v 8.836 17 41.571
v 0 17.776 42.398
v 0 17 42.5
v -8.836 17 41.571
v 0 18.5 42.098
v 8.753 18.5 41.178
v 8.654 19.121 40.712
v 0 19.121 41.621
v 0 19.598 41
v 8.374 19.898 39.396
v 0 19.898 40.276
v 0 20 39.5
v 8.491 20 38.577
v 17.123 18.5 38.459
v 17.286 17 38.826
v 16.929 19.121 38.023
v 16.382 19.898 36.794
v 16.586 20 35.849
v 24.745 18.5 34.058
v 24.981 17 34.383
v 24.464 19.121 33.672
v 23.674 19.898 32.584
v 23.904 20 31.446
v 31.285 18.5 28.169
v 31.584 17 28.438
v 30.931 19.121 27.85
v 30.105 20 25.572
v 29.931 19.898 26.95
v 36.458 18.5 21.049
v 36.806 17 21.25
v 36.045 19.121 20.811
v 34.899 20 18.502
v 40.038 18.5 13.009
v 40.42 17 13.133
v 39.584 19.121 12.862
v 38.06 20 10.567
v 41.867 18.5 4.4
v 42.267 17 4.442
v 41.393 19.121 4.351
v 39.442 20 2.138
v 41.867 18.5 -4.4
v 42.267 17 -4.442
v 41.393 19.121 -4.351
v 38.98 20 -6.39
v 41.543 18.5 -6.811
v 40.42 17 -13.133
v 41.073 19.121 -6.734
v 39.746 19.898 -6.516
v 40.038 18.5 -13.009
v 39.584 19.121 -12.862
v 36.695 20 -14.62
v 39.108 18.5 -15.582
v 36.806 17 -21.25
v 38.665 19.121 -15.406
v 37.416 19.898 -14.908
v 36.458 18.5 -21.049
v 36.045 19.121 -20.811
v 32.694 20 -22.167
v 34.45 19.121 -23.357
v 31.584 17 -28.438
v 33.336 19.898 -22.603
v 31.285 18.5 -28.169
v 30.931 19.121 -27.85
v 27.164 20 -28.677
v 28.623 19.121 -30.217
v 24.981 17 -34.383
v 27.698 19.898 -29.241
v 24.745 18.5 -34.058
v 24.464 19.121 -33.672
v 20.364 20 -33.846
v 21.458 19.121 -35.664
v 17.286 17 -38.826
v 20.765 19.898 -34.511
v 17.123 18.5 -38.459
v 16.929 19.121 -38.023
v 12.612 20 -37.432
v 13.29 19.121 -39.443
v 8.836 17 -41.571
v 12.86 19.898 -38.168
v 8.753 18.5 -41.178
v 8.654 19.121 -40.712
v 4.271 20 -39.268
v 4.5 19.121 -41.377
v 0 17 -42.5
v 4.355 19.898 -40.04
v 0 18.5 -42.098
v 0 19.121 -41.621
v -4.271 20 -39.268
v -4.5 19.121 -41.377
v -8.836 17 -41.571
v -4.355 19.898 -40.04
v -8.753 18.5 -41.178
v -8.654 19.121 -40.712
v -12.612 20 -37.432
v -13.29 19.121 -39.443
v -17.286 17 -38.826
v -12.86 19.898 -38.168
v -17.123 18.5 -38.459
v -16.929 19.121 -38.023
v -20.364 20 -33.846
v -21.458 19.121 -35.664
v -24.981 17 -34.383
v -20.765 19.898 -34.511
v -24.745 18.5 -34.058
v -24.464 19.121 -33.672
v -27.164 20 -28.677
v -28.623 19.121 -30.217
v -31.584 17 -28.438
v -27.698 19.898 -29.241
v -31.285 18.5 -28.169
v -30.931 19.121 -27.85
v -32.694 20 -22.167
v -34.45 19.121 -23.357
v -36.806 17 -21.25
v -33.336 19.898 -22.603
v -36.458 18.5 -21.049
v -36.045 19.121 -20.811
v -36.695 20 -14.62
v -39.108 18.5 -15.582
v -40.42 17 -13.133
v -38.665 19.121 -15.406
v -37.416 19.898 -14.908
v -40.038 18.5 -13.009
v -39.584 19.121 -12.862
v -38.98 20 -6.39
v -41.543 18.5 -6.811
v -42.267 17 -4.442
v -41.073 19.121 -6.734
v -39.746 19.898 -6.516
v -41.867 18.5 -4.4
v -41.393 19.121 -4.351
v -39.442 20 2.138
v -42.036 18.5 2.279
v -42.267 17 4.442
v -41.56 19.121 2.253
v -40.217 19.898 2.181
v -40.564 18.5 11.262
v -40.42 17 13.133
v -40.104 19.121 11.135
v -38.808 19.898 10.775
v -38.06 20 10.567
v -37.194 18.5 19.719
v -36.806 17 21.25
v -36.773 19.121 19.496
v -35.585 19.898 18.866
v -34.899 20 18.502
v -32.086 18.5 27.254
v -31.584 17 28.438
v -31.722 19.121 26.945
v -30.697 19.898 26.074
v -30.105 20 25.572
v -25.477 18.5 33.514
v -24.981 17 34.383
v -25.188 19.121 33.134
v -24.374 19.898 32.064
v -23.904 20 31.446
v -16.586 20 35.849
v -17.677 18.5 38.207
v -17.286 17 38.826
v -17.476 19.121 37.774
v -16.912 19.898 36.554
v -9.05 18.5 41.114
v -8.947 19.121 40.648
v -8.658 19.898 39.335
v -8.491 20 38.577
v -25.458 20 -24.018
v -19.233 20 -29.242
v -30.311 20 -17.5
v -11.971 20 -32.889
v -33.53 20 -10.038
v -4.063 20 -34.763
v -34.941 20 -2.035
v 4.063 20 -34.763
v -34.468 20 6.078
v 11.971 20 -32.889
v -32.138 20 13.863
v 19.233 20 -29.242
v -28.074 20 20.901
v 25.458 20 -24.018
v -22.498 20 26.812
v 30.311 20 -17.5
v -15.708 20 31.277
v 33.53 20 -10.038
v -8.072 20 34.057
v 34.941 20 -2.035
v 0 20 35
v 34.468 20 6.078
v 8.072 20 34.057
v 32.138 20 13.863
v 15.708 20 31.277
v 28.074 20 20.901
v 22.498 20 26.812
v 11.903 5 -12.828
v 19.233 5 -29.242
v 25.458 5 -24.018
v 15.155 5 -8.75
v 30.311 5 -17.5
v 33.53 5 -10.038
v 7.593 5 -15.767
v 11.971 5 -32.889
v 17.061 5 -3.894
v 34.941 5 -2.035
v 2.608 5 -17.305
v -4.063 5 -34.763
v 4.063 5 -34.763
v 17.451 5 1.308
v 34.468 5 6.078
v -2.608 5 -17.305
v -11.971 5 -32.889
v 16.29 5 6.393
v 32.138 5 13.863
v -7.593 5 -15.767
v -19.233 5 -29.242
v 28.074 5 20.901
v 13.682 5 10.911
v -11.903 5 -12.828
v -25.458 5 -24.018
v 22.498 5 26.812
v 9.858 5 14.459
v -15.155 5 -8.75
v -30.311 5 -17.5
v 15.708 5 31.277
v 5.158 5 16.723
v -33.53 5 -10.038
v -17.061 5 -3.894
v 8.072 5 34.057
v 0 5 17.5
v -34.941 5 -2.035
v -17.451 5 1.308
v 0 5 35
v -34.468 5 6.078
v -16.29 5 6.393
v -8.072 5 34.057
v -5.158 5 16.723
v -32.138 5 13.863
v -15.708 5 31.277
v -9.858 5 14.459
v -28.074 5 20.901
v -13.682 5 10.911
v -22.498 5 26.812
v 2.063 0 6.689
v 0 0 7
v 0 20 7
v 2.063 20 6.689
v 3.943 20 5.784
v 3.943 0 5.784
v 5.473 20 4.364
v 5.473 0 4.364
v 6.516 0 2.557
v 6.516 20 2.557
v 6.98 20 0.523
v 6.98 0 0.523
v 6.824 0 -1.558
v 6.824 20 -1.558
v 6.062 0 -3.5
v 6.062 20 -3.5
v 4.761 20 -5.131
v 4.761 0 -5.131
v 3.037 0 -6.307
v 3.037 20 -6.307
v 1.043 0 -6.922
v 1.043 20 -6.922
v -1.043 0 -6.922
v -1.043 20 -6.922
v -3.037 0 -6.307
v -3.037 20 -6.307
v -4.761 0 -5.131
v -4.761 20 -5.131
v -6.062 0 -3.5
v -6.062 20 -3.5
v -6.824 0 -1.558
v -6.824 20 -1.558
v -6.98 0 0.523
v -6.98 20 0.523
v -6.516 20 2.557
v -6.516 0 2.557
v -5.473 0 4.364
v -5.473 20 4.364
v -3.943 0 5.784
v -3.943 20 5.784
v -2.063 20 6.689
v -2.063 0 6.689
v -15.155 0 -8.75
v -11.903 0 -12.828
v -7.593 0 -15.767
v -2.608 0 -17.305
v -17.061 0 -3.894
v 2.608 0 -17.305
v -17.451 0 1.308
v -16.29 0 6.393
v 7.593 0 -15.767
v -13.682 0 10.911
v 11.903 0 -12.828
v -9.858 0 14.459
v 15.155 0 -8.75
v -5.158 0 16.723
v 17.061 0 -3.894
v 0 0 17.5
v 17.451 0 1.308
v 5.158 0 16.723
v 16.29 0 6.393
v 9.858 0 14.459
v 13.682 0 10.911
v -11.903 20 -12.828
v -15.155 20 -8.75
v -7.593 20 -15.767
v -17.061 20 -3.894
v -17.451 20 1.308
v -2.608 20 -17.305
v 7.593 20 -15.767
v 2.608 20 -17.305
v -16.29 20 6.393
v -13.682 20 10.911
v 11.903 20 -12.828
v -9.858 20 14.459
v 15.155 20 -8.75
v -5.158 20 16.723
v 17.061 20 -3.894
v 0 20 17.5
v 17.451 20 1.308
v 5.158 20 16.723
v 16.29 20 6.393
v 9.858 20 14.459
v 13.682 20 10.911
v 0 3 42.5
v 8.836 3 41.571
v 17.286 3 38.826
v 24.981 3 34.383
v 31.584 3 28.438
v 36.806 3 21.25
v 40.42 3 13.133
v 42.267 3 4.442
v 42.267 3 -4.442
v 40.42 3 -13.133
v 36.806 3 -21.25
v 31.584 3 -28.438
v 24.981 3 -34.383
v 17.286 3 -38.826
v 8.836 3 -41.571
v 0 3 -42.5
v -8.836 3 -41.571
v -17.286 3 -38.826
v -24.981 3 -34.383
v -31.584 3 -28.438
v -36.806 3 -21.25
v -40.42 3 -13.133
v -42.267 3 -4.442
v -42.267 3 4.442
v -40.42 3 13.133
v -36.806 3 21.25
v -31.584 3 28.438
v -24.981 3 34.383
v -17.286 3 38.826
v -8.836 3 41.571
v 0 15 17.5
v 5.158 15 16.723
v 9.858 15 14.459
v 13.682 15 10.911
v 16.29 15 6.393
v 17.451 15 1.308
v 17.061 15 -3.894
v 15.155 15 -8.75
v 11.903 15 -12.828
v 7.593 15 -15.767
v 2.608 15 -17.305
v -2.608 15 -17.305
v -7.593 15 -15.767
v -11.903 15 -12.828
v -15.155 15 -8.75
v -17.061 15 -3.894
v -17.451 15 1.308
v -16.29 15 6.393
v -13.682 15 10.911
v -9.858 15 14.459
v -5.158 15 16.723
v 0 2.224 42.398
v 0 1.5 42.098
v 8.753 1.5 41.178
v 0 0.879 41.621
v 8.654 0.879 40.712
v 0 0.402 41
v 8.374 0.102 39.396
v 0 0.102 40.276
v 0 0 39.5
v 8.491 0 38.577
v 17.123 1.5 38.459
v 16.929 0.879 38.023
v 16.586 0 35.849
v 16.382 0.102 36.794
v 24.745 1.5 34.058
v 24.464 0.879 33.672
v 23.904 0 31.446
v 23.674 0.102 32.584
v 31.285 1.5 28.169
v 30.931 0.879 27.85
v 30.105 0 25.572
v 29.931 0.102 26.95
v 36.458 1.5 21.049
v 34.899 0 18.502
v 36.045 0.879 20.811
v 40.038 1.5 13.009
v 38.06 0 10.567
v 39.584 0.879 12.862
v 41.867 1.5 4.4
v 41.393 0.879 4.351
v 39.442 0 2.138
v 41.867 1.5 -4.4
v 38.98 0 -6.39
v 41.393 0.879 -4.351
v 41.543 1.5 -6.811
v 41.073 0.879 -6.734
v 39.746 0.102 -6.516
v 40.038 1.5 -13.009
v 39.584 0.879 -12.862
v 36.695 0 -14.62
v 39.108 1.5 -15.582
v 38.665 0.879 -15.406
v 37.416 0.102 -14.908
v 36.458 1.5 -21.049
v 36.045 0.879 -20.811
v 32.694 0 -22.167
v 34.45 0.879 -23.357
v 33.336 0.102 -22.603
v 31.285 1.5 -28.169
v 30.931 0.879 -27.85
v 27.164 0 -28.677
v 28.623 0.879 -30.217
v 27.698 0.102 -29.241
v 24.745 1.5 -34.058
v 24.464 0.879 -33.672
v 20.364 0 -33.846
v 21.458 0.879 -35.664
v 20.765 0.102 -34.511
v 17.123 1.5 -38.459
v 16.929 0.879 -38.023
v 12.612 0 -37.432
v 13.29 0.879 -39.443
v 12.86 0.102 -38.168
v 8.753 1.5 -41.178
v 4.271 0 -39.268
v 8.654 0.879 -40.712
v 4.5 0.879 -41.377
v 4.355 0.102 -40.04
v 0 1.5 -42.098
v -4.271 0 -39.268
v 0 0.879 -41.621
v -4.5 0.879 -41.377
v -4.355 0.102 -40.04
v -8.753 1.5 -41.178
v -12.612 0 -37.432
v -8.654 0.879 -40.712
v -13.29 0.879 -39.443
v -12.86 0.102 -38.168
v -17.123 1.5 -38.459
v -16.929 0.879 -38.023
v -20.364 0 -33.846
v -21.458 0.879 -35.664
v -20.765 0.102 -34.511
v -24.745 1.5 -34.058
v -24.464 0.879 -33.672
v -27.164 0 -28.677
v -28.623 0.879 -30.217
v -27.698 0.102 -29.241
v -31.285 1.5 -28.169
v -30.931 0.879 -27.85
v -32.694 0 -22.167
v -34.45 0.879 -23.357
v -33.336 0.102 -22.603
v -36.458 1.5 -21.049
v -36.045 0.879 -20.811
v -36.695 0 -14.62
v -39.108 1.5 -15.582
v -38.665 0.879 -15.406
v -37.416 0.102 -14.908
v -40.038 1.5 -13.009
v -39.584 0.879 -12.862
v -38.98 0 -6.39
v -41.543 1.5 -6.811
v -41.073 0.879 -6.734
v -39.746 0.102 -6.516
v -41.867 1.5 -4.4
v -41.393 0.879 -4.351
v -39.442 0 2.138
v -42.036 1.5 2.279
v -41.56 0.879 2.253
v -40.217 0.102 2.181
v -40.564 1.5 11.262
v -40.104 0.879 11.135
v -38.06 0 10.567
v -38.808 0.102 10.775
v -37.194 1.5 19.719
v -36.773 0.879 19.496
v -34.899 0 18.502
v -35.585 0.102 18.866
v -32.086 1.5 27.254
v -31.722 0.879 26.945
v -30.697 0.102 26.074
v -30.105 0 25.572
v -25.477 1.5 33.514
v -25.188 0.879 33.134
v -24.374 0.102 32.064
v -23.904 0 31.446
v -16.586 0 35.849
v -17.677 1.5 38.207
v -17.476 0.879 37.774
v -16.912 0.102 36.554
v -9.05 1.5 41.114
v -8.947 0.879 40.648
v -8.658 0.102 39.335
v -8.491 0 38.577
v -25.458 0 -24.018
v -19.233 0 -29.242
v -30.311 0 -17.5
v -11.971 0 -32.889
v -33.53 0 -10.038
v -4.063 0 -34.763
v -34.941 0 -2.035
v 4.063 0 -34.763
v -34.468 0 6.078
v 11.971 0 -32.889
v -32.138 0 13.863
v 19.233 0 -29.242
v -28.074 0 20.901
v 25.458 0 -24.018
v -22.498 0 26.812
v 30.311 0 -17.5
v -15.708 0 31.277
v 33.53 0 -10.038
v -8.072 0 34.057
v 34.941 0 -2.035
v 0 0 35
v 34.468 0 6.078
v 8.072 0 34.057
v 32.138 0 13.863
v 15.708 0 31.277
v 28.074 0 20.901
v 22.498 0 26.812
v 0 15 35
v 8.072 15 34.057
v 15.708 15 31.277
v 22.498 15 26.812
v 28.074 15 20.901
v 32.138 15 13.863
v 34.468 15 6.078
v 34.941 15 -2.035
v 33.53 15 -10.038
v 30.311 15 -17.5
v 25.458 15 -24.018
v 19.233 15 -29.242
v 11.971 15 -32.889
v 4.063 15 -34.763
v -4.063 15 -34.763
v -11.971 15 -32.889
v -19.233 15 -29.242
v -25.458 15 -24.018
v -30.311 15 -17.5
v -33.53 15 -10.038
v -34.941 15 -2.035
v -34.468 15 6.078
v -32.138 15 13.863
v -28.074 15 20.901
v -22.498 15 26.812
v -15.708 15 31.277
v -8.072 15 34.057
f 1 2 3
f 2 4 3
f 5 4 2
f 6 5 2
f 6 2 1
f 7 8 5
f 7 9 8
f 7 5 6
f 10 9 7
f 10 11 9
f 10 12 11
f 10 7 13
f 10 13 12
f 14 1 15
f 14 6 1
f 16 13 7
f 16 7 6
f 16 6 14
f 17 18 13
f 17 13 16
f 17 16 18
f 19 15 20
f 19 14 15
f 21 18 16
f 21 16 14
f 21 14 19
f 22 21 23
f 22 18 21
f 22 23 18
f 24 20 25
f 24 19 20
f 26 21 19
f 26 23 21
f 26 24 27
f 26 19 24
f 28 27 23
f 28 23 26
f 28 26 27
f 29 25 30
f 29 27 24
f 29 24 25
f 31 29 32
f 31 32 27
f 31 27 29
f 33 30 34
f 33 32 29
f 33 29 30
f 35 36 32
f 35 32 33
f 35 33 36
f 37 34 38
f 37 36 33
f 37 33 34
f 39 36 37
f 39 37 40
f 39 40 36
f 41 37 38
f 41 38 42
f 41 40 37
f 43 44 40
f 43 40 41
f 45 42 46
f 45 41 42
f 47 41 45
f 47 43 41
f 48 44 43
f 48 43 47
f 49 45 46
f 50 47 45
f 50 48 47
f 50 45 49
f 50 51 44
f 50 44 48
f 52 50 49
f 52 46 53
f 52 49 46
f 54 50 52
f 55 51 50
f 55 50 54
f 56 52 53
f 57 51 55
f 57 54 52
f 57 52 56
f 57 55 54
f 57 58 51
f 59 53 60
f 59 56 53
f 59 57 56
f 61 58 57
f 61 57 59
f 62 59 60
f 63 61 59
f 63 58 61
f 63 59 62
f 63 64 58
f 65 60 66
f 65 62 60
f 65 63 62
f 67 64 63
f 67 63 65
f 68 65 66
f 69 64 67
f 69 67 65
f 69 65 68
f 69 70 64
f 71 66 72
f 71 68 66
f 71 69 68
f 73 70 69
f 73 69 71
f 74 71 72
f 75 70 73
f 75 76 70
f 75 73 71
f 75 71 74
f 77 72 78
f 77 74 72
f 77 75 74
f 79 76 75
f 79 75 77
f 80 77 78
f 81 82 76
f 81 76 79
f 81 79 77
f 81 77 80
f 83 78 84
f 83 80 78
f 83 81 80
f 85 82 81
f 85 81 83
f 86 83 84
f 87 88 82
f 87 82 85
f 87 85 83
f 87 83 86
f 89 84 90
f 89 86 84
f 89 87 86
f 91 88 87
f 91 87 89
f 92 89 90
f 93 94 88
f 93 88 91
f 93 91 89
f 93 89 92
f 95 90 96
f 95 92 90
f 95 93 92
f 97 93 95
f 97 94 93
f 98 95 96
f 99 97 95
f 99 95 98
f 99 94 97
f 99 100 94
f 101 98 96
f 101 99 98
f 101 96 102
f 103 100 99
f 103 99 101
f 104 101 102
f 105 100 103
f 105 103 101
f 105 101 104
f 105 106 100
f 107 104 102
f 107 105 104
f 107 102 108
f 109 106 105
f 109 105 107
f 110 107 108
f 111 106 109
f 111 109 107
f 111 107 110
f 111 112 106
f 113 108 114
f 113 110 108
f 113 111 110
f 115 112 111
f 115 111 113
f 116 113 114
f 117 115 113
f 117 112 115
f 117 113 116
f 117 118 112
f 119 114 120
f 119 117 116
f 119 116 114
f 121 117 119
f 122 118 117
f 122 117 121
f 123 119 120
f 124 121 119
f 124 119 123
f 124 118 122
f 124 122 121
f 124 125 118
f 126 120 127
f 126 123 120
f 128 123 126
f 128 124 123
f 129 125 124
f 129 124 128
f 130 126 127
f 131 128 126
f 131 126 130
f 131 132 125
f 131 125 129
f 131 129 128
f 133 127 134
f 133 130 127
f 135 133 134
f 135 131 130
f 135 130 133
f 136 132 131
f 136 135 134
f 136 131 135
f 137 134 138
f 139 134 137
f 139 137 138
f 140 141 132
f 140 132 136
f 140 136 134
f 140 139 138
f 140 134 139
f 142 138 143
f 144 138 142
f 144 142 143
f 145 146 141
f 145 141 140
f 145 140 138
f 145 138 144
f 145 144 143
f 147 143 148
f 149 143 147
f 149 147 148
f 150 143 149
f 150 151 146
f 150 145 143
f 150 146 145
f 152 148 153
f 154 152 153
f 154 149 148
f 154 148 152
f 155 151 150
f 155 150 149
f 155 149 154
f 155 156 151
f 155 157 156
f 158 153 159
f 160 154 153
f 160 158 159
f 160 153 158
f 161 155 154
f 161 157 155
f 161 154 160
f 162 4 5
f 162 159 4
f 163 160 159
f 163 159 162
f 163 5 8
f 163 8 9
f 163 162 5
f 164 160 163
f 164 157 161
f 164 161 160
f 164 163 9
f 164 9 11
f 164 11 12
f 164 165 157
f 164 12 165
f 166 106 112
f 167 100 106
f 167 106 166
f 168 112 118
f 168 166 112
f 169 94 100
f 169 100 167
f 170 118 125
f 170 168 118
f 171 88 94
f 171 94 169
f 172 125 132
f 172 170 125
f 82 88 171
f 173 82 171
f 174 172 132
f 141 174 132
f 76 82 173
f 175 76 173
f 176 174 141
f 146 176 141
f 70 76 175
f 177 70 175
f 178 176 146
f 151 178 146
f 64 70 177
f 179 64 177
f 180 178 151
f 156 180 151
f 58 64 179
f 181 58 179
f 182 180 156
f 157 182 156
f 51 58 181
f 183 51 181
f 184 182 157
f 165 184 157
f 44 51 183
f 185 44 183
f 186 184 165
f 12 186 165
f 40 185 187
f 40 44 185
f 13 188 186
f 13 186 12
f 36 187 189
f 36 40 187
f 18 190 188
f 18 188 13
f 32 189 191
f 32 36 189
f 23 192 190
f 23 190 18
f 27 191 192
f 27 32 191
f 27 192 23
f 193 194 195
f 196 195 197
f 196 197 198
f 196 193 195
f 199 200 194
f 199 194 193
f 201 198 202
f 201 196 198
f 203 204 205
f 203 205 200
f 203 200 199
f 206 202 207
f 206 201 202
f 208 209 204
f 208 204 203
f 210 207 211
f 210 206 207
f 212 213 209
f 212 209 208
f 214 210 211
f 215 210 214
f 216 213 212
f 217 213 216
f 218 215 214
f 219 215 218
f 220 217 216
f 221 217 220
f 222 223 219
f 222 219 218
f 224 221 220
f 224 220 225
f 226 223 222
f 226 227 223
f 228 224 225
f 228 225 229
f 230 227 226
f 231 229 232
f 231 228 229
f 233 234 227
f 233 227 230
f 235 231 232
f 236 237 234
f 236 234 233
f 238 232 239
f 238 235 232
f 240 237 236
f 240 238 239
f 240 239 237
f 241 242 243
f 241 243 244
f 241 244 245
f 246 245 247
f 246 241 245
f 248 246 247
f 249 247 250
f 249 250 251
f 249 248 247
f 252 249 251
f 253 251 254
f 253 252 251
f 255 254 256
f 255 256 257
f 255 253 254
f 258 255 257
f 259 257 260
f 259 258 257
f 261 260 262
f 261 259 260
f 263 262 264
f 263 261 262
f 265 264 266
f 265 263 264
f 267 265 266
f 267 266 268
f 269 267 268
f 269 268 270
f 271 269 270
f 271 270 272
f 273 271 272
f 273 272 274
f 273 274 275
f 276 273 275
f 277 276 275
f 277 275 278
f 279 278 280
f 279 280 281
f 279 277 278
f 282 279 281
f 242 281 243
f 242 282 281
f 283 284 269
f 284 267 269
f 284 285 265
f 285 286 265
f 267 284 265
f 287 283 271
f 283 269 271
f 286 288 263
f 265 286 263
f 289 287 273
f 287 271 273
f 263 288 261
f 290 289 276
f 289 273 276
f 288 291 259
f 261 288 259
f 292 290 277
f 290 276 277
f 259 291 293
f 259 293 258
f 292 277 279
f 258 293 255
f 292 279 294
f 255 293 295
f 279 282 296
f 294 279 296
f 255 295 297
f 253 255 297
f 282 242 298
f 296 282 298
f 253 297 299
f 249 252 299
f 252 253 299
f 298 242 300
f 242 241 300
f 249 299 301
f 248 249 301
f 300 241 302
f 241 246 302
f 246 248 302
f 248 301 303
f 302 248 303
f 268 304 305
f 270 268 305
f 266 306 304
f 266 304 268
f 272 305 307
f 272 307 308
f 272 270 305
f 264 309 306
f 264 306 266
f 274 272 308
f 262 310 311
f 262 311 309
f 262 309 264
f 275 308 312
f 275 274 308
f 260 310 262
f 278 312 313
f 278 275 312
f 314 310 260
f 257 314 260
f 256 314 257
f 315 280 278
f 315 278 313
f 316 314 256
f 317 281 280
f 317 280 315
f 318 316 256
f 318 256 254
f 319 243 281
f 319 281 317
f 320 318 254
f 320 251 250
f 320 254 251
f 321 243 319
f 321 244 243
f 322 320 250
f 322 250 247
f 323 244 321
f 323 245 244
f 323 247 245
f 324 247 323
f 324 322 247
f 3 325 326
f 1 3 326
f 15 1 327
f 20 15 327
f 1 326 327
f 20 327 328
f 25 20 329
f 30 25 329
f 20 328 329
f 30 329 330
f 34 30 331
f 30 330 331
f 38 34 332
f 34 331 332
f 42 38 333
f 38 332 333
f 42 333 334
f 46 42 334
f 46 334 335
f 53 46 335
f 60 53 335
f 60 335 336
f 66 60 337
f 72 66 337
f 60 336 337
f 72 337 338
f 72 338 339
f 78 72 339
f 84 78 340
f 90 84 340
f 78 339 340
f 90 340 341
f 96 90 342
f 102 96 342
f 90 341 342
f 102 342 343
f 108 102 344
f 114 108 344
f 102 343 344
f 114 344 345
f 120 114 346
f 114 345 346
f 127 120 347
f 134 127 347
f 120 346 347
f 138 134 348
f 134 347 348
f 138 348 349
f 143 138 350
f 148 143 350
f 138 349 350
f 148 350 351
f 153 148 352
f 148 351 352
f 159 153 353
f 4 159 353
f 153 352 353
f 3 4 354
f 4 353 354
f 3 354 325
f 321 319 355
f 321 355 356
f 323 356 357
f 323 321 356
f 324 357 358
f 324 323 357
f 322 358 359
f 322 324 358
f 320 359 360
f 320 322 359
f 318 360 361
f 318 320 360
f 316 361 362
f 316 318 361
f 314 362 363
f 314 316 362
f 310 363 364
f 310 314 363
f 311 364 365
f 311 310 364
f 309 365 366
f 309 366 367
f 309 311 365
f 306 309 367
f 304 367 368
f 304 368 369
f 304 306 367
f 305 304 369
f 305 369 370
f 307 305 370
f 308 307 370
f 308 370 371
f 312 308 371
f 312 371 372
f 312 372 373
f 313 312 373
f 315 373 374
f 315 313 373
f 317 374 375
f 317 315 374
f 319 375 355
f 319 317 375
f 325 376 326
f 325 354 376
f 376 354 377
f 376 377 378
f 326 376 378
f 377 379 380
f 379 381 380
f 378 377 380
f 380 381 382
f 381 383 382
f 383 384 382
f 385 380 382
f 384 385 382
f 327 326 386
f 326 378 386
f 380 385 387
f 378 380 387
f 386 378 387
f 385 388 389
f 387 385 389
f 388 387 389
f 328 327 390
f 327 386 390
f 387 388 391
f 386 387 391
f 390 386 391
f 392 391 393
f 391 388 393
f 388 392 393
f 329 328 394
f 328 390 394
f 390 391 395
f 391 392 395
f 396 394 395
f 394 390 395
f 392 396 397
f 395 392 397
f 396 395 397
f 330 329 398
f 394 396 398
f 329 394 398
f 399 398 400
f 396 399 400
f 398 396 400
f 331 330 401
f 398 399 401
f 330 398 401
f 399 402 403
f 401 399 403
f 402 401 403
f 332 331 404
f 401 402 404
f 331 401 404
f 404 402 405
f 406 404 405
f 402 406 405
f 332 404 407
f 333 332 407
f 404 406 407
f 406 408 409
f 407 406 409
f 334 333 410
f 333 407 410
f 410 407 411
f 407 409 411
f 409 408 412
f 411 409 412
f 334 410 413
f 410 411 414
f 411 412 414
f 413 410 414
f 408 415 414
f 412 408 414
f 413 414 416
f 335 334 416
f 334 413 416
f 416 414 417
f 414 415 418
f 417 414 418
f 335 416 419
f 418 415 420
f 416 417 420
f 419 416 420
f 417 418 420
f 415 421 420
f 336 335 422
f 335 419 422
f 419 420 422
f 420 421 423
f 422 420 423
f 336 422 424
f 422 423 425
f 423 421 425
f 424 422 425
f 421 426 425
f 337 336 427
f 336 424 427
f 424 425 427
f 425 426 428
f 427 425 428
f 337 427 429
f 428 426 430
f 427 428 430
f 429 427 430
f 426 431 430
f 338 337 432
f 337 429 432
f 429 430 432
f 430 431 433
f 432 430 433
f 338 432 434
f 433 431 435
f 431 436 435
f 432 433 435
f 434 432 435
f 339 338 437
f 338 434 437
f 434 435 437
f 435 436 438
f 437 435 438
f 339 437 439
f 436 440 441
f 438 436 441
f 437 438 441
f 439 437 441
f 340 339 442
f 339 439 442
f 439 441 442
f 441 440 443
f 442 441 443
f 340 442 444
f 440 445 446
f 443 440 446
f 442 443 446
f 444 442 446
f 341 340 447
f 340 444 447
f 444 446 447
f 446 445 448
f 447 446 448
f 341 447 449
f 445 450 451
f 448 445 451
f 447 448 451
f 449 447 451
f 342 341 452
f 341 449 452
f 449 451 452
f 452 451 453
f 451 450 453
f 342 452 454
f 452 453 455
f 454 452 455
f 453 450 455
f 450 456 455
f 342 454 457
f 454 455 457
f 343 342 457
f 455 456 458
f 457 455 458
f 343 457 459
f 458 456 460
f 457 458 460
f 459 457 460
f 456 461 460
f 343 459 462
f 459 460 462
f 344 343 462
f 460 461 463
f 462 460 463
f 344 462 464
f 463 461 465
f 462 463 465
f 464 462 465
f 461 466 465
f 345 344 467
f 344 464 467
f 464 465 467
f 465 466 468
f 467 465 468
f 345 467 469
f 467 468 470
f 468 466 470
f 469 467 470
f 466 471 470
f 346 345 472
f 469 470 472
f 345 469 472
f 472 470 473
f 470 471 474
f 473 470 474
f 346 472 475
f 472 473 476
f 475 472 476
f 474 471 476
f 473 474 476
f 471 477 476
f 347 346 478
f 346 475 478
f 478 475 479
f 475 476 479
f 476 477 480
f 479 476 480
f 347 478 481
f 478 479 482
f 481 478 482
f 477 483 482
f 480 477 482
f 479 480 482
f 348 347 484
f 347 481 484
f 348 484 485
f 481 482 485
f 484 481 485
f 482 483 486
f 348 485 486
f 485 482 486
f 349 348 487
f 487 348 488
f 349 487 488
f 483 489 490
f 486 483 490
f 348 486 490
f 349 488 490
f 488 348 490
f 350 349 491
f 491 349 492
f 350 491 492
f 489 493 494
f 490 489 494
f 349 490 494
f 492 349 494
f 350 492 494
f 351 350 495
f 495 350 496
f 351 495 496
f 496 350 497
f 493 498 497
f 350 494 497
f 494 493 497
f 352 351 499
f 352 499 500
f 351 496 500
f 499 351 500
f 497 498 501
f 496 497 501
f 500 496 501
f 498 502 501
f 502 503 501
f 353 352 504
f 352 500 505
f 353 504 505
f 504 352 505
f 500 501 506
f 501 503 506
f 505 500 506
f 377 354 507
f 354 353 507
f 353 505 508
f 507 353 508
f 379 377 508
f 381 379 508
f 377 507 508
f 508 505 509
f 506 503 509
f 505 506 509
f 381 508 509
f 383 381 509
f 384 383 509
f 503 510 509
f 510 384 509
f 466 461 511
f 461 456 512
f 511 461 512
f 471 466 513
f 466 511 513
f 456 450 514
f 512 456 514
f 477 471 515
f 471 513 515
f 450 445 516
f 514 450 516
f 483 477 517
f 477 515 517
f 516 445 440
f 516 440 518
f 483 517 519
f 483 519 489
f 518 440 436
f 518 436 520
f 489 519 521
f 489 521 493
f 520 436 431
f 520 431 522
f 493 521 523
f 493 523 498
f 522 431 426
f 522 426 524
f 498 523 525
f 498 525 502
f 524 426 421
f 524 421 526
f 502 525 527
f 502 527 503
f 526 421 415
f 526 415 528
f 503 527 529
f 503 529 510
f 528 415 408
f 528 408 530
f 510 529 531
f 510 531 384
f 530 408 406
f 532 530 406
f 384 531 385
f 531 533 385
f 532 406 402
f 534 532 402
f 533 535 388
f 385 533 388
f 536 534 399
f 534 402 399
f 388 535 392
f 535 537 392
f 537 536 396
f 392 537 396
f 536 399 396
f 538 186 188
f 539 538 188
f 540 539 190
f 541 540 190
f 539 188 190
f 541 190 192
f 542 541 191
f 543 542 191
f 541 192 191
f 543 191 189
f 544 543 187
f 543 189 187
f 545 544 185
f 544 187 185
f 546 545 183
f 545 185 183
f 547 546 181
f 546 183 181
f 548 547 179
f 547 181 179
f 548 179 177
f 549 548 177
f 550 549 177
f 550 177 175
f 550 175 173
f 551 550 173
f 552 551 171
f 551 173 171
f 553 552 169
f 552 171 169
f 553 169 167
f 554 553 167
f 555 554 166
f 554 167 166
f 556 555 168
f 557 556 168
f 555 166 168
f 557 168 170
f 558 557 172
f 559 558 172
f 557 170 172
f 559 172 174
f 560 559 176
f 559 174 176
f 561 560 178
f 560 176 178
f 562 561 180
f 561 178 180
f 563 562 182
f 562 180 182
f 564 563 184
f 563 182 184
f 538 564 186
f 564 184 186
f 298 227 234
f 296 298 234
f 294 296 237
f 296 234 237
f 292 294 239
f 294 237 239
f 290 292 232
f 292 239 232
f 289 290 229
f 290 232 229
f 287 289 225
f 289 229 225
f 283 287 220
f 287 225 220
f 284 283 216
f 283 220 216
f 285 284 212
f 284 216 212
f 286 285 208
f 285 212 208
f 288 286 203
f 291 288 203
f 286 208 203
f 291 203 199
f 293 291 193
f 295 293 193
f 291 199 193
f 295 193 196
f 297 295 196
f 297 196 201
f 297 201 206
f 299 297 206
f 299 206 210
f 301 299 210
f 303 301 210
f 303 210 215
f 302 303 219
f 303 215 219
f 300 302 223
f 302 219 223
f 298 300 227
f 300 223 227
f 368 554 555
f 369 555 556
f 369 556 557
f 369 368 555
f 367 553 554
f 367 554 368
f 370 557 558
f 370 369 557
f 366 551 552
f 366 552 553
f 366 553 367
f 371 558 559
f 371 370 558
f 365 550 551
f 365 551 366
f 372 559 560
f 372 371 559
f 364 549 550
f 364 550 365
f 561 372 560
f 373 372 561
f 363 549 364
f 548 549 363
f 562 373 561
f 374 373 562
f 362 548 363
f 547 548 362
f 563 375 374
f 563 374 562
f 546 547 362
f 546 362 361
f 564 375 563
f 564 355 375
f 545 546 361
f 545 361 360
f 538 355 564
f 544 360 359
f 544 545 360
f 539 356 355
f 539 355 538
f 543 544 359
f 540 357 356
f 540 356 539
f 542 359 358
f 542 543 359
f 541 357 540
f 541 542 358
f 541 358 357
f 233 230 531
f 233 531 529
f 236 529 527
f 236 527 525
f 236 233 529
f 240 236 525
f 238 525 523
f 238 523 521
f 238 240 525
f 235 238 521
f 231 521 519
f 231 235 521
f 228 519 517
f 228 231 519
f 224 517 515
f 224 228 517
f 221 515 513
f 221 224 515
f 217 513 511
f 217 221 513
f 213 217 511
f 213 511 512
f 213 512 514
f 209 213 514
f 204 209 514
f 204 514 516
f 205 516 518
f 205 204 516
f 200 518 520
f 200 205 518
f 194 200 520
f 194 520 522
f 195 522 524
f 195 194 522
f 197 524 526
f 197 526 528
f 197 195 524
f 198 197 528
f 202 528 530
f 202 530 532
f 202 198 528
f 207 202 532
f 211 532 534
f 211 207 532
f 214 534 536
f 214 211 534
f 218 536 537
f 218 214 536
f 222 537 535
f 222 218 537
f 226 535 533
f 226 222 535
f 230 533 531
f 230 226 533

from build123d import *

# Parameters (mm, degrees)
SKETCH_1_R          = 42.5
SKETCH_1_R_2        = 7
EXTRUDE_1_DEPTH     = 20
SKETCH_2_R          = 35
SKETCH_2_R_2        = 17.5
CUT_EXTRUDE_1_DEPTH = 5
CUT_EXTRUDE_START   = -5
SKETCH_3_R          = 35
SKETCH_3_R_2        = 17.5
CUT_EXTRUDE_2_DEPTH = 5
FILLET_1_R          = 3


with BuildPart() as part:
    # 草图1 → 凸台-拉伸1 (new body)
    with BuildSketch(Plane(origin=(0, 0, 0), x_dir=(1, 0, 0), z_dir=(0, 1, 0))):
        with Locations(Location((0, 0, 0), (0, 0, 270))):
            Circle(SKETCH_1_R)
        with Locations(Location((0, 0, 0), (0, 0, 270))):
            Circle(SKETCH_1_R_2, mode=Mode.SUBTRACT)
    extrude(amount=EXTRUDE_1_DEPTH)

    # 草图2 → 切除-拉伸1 (cut)
    with BuildSketch(Plane(origin=(0, 20, 0), x_dir=(1, 0, 0), z_dir=(0, 1, 0))):
        with Locations(Location((0, 0, 0), (0, 0, 270))):
            Circle(SKETCH_2_R)
        with Locations(Location((0, 0, 0), (0, 0, 270))):
            Circle(SKETCH_2_R_2, mode=Mode.SUBTRACT)
    extrude(amount=-CUT_EXTRUDE_1_DEPTH, mode=Mode.SUBTRACT)

    # 草图3 → 切除-拉伸2 (cut)
    with BuildSketch(Plane.XZ.offset(CUT_EXTRUDE_START)):
        with Locations(Location((0, 0, 0), (0, 0, 90))):
            Circle(SKETCH_3_R)
        with Locations(Location((0, 0, 0), (0, 0, 90))):
            Circle(SKETCH_3_R_2, mode=Mode.SUBTRACT)
    extrude(amount=CUT_EXTRUDE_2_DEPTH, mode=Mode.SUBTRACT)

    # 圆角1
    fillet_1_edges = [part.edges().sort_by_distance(p)[0] for p in [
        (0, 0, -42.5),
        (0, 20, -42.5),
    ]]
    fillet(fillet_1_edges, radius=FILLET_1_R)


solid = part.part
